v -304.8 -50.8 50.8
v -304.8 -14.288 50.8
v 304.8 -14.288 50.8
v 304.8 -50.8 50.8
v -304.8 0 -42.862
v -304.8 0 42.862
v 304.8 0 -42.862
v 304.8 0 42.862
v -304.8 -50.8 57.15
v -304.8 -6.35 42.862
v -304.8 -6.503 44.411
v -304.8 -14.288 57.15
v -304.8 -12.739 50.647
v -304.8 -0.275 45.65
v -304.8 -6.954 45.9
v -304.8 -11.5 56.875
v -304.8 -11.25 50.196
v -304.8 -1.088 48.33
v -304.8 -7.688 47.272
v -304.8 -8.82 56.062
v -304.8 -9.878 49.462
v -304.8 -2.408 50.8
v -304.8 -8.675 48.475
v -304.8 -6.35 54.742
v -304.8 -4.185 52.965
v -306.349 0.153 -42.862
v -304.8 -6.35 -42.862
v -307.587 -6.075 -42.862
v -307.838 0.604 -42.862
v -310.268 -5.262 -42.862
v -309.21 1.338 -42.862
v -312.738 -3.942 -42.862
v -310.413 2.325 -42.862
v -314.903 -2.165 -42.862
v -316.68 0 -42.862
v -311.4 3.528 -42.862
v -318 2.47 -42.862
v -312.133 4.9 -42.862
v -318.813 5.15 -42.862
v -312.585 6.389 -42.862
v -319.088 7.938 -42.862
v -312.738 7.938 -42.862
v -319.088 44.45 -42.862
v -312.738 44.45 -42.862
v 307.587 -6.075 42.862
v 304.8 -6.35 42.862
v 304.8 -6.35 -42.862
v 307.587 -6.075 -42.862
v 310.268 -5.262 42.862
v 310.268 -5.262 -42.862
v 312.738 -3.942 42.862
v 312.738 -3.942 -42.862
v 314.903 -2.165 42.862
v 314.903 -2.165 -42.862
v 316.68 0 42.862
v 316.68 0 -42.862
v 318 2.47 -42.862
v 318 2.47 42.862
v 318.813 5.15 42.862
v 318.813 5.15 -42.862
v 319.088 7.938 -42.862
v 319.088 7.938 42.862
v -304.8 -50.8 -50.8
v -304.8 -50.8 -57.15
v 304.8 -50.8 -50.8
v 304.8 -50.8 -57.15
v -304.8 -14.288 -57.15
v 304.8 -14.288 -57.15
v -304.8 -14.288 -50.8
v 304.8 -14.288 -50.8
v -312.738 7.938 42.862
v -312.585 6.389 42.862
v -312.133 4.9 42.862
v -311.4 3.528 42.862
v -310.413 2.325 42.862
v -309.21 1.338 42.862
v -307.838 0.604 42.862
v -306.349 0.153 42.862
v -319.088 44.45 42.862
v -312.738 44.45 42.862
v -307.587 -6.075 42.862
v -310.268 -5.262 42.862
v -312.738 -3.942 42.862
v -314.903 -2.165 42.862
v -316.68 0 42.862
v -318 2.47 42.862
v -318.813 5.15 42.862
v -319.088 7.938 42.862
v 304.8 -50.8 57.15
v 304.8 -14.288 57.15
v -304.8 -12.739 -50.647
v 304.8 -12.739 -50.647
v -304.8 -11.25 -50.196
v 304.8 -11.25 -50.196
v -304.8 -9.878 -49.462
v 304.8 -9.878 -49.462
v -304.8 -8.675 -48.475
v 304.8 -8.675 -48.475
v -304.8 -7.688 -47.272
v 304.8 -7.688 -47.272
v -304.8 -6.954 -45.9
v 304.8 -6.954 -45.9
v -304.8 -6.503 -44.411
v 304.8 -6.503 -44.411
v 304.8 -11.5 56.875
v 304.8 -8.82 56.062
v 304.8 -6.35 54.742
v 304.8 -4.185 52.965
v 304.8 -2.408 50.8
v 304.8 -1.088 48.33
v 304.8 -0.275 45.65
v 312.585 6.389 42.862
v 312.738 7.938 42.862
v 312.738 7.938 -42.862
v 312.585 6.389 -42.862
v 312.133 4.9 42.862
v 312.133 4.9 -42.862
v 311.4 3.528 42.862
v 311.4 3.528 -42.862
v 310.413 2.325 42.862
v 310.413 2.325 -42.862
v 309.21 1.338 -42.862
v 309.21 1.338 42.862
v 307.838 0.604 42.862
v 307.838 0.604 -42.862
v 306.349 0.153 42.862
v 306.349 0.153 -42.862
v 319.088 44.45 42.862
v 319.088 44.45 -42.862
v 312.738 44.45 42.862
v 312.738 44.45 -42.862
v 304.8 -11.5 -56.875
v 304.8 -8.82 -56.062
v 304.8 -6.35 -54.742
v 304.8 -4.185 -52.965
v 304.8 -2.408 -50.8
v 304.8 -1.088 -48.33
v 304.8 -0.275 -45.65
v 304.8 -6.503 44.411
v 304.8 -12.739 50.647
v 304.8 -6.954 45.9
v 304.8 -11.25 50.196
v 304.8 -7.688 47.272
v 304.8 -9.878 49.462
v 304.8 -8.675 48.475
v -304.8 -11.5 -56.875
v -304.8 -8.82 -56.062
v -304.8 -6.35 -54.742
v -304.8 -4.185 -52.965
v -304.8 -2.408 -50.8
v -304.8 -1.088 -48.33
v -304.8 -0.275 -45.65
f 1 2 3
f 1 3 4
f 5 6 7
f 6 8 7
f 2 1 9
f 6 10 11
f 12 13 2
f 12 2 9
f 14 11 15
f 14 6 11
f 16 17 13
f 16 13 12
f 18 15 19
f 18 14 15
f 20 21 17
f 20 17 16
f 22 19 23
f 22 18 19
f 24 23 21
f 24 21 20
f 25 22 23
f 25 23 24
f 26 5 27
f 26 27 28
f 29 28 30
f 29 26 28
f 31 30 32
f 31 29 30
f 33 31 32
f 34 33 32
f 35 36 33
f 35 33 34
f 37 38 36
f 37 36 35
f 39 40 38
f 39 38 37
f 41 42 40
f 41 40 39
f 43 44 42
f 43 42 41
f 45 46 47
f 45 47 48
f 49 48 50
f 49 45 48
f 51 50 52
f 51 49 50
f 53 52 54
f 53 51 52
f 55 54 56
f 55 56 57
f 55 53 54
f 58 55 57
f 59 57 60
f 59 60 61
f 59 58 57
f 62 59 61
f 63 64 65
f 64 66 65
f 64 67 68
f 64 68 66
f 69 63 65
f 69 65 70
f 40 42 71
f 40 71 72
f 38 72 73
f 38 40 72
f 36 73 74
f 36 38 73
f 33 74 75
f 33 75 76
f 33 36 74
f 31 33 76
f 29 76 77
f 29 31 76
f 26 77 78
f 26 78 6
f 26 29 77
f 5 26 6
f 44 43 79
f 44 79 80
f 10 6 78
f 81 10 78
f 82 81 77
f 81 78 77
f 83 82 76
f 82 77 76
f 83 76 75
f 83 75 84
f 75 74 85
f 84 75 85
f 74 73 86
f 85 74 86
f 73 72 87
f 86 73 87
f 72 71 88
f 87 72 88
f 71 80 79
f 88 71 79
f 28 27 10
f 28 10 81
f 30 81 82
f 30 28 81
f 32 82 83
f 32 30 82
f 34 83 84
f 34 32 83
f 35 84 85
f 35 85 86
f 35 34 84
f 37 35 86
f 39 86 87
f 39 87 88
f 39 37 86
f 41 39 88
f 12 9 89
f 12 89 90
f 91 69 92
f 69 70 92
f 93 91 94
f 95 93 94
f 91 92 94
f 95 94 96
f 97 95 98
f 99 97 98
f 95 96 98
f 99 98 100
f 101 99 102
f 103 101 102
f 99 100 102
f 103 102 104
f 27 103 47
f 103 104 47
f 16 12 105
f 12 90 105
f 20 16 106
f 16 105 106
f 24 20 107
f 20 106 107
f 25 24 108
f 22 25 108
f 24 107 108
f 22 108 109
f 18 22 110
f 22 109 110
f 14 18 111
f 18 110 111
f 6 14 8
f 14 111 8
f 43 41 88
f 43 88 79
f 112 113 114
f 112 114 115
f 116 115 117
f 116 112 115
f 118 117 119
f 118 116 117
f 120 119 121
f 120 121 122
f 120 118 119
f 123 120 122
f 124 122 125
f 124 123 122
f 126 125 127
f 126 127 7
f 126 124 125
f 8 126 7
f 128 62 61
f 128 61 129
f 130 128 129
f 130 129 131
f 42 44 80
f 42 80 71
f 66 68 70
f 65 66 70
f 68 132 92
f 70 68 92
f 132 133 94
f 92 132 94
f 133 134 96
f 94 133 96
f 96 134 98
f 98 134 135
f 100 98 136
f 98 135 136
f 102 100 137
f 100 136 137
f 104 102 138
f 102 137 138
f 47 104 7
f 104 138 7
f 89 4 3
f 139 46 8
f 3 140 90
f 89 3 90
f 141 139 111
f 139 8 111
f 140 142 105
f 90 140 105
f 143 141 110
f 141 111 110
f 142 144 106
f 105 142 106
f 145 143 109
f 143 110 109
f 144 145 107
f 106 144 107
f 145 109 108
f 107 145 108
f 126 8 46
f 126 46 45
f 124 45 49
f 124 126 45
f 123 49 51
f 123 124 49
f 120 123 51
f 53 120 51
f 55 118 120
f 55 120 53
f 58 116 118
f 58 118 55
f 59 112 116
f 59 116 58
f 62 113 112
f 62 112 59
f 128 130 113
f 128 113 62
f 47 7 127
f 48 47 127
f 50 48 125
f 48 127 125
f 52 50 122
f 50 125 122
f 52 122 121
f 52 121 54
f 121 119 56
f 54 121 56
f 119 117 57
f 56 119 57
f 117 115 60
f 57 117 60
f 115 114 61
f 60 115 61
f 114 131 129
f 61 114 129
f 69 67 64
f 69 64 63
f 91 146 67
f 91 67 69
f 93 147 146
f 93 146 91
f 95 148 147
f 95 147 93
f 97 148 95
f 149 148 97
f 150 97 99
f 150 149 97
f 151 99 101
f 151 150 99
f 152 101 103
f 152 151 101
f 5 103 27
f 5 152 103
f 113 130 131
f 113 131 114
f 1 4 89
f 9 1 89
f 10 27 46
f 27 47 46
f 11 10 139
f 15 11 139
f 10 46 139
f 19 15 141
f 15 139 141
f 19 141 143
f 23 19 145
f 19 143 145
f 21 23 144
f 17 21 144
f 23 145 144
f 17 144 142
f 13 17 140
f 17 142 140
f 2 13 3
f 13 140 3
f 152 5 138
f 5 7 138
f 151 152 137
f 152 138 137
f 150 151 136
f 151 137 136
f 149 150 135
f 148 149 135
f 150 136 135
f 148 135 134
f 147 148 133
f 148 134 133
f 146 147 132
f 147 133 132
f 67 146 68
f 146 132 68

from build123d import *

# Parameters (mm, degrees)
BASE_FLANGE1_DEPTH      = 304.8
EDGE_FLANGE1_DEPTH      = 85.725
EDGE_FLANGE1_BEND_DEPTH = 85.725


# Sheet-metal steps are written as plain solids
with BuildPart() as part:
    # Sketch1 → Base-Flange1 (new, symmetric)
    with BuildSketch(Plane(origin=(0, 0, 0), x_dir=(0, 0, -1), z_dir=(1, 0, 0))):
        with BuildLine():
            Line((-57.15, -50.8), (-57.15, -14.2875))
            ThreePointArc((-57.15, -14.2875), (-52.965288136, -4.184711864), (-42.8625, 0))
            Line((-42.8625, 0), (42.8625, 0))
            ThreePointArc((42.8625, 0), (52.965288136, -4.184711864), (57.15, -14.2875))
            Line((57.15, -14.2875), (57.15, -50.8))
            Line((57.15, -50.8), (50.8, -50.8))
            Line((50.8, -50.8), (50.8, -14.2875))
            ThreePointArc((50.8, -14.2875), (48.475160076, -8.674839924), (42.8625, -6.35))
            Line((42.8625, -6.35), (-42.8625, -6.35))
            ThreePointArc((-42.8625, -6.35), (-48.475160076, -8.674839924), (-50.8, -14.2875))
            Line((-50.8, -14.2875), (-50.8, -50.8))
            Line((-50.8, -50.8), (-57.15, -50.8))
        make_face()
    extrude(amount=BASE_FLANGE1_DEPTH, both=True)

    # Edge-Flange1 section (across the edge) → Edge-Flange1 (add)
    with BuildSketch(Plane(origin=(312.7375, 0, 42.8625), x_dir=(-1, 0, 0), z_dir=(0, 0, -1))):
        with BuildLine():
            Line((-6.35, 7.9375), (-6.35, 44.45))
            Line((-6.35, 44.45), (0, 44.45))
            Line((0, 44.45), (0, 7.9375))
            ThreePointArc((0, 7.9375), (2.324839924, 2.324839924), (7.9375, 0))
            Line((7.9375, 0), (7.9375, -6.35))
            ThreePointArc((7.9375, -6.35), (-2.165288136, -2.165288136), (-6.35, 7.9375))
        make_face()
    extrude(amount=EDGE_FLANGE1_DEPTH)

    # Edge-Flange1 section 2 (across the edge) → Edge-Flange1 bend (add)
    with BuildSketch(Plane(origin=(-312.7375, 0, -42.8625), x_dir=(1, 0, 0), z_dir=(0, 0, 1))):
        with BuildLine():
            Line((-6.35, 7.9375), (-6.35, 44.45))
            Line((-6.35, 44.45), (0, 44.45))
            Line((0, 44.45), (0, 7.9375))
            ThreePointArc((0, 7.9375), (2.324839924, 2.324839924), (7.9375, 0))
            Line((7.9375, 0), (7.9375, -6.35))
            ThreePointArc((7.9375, -6.35), (-2.165288136, -2.165288136), (-6.35, 7.9375))
        make_face()
    extrude(amount=EDGE_FLANGE1_BEND_DEPTH)


solid = part.part
